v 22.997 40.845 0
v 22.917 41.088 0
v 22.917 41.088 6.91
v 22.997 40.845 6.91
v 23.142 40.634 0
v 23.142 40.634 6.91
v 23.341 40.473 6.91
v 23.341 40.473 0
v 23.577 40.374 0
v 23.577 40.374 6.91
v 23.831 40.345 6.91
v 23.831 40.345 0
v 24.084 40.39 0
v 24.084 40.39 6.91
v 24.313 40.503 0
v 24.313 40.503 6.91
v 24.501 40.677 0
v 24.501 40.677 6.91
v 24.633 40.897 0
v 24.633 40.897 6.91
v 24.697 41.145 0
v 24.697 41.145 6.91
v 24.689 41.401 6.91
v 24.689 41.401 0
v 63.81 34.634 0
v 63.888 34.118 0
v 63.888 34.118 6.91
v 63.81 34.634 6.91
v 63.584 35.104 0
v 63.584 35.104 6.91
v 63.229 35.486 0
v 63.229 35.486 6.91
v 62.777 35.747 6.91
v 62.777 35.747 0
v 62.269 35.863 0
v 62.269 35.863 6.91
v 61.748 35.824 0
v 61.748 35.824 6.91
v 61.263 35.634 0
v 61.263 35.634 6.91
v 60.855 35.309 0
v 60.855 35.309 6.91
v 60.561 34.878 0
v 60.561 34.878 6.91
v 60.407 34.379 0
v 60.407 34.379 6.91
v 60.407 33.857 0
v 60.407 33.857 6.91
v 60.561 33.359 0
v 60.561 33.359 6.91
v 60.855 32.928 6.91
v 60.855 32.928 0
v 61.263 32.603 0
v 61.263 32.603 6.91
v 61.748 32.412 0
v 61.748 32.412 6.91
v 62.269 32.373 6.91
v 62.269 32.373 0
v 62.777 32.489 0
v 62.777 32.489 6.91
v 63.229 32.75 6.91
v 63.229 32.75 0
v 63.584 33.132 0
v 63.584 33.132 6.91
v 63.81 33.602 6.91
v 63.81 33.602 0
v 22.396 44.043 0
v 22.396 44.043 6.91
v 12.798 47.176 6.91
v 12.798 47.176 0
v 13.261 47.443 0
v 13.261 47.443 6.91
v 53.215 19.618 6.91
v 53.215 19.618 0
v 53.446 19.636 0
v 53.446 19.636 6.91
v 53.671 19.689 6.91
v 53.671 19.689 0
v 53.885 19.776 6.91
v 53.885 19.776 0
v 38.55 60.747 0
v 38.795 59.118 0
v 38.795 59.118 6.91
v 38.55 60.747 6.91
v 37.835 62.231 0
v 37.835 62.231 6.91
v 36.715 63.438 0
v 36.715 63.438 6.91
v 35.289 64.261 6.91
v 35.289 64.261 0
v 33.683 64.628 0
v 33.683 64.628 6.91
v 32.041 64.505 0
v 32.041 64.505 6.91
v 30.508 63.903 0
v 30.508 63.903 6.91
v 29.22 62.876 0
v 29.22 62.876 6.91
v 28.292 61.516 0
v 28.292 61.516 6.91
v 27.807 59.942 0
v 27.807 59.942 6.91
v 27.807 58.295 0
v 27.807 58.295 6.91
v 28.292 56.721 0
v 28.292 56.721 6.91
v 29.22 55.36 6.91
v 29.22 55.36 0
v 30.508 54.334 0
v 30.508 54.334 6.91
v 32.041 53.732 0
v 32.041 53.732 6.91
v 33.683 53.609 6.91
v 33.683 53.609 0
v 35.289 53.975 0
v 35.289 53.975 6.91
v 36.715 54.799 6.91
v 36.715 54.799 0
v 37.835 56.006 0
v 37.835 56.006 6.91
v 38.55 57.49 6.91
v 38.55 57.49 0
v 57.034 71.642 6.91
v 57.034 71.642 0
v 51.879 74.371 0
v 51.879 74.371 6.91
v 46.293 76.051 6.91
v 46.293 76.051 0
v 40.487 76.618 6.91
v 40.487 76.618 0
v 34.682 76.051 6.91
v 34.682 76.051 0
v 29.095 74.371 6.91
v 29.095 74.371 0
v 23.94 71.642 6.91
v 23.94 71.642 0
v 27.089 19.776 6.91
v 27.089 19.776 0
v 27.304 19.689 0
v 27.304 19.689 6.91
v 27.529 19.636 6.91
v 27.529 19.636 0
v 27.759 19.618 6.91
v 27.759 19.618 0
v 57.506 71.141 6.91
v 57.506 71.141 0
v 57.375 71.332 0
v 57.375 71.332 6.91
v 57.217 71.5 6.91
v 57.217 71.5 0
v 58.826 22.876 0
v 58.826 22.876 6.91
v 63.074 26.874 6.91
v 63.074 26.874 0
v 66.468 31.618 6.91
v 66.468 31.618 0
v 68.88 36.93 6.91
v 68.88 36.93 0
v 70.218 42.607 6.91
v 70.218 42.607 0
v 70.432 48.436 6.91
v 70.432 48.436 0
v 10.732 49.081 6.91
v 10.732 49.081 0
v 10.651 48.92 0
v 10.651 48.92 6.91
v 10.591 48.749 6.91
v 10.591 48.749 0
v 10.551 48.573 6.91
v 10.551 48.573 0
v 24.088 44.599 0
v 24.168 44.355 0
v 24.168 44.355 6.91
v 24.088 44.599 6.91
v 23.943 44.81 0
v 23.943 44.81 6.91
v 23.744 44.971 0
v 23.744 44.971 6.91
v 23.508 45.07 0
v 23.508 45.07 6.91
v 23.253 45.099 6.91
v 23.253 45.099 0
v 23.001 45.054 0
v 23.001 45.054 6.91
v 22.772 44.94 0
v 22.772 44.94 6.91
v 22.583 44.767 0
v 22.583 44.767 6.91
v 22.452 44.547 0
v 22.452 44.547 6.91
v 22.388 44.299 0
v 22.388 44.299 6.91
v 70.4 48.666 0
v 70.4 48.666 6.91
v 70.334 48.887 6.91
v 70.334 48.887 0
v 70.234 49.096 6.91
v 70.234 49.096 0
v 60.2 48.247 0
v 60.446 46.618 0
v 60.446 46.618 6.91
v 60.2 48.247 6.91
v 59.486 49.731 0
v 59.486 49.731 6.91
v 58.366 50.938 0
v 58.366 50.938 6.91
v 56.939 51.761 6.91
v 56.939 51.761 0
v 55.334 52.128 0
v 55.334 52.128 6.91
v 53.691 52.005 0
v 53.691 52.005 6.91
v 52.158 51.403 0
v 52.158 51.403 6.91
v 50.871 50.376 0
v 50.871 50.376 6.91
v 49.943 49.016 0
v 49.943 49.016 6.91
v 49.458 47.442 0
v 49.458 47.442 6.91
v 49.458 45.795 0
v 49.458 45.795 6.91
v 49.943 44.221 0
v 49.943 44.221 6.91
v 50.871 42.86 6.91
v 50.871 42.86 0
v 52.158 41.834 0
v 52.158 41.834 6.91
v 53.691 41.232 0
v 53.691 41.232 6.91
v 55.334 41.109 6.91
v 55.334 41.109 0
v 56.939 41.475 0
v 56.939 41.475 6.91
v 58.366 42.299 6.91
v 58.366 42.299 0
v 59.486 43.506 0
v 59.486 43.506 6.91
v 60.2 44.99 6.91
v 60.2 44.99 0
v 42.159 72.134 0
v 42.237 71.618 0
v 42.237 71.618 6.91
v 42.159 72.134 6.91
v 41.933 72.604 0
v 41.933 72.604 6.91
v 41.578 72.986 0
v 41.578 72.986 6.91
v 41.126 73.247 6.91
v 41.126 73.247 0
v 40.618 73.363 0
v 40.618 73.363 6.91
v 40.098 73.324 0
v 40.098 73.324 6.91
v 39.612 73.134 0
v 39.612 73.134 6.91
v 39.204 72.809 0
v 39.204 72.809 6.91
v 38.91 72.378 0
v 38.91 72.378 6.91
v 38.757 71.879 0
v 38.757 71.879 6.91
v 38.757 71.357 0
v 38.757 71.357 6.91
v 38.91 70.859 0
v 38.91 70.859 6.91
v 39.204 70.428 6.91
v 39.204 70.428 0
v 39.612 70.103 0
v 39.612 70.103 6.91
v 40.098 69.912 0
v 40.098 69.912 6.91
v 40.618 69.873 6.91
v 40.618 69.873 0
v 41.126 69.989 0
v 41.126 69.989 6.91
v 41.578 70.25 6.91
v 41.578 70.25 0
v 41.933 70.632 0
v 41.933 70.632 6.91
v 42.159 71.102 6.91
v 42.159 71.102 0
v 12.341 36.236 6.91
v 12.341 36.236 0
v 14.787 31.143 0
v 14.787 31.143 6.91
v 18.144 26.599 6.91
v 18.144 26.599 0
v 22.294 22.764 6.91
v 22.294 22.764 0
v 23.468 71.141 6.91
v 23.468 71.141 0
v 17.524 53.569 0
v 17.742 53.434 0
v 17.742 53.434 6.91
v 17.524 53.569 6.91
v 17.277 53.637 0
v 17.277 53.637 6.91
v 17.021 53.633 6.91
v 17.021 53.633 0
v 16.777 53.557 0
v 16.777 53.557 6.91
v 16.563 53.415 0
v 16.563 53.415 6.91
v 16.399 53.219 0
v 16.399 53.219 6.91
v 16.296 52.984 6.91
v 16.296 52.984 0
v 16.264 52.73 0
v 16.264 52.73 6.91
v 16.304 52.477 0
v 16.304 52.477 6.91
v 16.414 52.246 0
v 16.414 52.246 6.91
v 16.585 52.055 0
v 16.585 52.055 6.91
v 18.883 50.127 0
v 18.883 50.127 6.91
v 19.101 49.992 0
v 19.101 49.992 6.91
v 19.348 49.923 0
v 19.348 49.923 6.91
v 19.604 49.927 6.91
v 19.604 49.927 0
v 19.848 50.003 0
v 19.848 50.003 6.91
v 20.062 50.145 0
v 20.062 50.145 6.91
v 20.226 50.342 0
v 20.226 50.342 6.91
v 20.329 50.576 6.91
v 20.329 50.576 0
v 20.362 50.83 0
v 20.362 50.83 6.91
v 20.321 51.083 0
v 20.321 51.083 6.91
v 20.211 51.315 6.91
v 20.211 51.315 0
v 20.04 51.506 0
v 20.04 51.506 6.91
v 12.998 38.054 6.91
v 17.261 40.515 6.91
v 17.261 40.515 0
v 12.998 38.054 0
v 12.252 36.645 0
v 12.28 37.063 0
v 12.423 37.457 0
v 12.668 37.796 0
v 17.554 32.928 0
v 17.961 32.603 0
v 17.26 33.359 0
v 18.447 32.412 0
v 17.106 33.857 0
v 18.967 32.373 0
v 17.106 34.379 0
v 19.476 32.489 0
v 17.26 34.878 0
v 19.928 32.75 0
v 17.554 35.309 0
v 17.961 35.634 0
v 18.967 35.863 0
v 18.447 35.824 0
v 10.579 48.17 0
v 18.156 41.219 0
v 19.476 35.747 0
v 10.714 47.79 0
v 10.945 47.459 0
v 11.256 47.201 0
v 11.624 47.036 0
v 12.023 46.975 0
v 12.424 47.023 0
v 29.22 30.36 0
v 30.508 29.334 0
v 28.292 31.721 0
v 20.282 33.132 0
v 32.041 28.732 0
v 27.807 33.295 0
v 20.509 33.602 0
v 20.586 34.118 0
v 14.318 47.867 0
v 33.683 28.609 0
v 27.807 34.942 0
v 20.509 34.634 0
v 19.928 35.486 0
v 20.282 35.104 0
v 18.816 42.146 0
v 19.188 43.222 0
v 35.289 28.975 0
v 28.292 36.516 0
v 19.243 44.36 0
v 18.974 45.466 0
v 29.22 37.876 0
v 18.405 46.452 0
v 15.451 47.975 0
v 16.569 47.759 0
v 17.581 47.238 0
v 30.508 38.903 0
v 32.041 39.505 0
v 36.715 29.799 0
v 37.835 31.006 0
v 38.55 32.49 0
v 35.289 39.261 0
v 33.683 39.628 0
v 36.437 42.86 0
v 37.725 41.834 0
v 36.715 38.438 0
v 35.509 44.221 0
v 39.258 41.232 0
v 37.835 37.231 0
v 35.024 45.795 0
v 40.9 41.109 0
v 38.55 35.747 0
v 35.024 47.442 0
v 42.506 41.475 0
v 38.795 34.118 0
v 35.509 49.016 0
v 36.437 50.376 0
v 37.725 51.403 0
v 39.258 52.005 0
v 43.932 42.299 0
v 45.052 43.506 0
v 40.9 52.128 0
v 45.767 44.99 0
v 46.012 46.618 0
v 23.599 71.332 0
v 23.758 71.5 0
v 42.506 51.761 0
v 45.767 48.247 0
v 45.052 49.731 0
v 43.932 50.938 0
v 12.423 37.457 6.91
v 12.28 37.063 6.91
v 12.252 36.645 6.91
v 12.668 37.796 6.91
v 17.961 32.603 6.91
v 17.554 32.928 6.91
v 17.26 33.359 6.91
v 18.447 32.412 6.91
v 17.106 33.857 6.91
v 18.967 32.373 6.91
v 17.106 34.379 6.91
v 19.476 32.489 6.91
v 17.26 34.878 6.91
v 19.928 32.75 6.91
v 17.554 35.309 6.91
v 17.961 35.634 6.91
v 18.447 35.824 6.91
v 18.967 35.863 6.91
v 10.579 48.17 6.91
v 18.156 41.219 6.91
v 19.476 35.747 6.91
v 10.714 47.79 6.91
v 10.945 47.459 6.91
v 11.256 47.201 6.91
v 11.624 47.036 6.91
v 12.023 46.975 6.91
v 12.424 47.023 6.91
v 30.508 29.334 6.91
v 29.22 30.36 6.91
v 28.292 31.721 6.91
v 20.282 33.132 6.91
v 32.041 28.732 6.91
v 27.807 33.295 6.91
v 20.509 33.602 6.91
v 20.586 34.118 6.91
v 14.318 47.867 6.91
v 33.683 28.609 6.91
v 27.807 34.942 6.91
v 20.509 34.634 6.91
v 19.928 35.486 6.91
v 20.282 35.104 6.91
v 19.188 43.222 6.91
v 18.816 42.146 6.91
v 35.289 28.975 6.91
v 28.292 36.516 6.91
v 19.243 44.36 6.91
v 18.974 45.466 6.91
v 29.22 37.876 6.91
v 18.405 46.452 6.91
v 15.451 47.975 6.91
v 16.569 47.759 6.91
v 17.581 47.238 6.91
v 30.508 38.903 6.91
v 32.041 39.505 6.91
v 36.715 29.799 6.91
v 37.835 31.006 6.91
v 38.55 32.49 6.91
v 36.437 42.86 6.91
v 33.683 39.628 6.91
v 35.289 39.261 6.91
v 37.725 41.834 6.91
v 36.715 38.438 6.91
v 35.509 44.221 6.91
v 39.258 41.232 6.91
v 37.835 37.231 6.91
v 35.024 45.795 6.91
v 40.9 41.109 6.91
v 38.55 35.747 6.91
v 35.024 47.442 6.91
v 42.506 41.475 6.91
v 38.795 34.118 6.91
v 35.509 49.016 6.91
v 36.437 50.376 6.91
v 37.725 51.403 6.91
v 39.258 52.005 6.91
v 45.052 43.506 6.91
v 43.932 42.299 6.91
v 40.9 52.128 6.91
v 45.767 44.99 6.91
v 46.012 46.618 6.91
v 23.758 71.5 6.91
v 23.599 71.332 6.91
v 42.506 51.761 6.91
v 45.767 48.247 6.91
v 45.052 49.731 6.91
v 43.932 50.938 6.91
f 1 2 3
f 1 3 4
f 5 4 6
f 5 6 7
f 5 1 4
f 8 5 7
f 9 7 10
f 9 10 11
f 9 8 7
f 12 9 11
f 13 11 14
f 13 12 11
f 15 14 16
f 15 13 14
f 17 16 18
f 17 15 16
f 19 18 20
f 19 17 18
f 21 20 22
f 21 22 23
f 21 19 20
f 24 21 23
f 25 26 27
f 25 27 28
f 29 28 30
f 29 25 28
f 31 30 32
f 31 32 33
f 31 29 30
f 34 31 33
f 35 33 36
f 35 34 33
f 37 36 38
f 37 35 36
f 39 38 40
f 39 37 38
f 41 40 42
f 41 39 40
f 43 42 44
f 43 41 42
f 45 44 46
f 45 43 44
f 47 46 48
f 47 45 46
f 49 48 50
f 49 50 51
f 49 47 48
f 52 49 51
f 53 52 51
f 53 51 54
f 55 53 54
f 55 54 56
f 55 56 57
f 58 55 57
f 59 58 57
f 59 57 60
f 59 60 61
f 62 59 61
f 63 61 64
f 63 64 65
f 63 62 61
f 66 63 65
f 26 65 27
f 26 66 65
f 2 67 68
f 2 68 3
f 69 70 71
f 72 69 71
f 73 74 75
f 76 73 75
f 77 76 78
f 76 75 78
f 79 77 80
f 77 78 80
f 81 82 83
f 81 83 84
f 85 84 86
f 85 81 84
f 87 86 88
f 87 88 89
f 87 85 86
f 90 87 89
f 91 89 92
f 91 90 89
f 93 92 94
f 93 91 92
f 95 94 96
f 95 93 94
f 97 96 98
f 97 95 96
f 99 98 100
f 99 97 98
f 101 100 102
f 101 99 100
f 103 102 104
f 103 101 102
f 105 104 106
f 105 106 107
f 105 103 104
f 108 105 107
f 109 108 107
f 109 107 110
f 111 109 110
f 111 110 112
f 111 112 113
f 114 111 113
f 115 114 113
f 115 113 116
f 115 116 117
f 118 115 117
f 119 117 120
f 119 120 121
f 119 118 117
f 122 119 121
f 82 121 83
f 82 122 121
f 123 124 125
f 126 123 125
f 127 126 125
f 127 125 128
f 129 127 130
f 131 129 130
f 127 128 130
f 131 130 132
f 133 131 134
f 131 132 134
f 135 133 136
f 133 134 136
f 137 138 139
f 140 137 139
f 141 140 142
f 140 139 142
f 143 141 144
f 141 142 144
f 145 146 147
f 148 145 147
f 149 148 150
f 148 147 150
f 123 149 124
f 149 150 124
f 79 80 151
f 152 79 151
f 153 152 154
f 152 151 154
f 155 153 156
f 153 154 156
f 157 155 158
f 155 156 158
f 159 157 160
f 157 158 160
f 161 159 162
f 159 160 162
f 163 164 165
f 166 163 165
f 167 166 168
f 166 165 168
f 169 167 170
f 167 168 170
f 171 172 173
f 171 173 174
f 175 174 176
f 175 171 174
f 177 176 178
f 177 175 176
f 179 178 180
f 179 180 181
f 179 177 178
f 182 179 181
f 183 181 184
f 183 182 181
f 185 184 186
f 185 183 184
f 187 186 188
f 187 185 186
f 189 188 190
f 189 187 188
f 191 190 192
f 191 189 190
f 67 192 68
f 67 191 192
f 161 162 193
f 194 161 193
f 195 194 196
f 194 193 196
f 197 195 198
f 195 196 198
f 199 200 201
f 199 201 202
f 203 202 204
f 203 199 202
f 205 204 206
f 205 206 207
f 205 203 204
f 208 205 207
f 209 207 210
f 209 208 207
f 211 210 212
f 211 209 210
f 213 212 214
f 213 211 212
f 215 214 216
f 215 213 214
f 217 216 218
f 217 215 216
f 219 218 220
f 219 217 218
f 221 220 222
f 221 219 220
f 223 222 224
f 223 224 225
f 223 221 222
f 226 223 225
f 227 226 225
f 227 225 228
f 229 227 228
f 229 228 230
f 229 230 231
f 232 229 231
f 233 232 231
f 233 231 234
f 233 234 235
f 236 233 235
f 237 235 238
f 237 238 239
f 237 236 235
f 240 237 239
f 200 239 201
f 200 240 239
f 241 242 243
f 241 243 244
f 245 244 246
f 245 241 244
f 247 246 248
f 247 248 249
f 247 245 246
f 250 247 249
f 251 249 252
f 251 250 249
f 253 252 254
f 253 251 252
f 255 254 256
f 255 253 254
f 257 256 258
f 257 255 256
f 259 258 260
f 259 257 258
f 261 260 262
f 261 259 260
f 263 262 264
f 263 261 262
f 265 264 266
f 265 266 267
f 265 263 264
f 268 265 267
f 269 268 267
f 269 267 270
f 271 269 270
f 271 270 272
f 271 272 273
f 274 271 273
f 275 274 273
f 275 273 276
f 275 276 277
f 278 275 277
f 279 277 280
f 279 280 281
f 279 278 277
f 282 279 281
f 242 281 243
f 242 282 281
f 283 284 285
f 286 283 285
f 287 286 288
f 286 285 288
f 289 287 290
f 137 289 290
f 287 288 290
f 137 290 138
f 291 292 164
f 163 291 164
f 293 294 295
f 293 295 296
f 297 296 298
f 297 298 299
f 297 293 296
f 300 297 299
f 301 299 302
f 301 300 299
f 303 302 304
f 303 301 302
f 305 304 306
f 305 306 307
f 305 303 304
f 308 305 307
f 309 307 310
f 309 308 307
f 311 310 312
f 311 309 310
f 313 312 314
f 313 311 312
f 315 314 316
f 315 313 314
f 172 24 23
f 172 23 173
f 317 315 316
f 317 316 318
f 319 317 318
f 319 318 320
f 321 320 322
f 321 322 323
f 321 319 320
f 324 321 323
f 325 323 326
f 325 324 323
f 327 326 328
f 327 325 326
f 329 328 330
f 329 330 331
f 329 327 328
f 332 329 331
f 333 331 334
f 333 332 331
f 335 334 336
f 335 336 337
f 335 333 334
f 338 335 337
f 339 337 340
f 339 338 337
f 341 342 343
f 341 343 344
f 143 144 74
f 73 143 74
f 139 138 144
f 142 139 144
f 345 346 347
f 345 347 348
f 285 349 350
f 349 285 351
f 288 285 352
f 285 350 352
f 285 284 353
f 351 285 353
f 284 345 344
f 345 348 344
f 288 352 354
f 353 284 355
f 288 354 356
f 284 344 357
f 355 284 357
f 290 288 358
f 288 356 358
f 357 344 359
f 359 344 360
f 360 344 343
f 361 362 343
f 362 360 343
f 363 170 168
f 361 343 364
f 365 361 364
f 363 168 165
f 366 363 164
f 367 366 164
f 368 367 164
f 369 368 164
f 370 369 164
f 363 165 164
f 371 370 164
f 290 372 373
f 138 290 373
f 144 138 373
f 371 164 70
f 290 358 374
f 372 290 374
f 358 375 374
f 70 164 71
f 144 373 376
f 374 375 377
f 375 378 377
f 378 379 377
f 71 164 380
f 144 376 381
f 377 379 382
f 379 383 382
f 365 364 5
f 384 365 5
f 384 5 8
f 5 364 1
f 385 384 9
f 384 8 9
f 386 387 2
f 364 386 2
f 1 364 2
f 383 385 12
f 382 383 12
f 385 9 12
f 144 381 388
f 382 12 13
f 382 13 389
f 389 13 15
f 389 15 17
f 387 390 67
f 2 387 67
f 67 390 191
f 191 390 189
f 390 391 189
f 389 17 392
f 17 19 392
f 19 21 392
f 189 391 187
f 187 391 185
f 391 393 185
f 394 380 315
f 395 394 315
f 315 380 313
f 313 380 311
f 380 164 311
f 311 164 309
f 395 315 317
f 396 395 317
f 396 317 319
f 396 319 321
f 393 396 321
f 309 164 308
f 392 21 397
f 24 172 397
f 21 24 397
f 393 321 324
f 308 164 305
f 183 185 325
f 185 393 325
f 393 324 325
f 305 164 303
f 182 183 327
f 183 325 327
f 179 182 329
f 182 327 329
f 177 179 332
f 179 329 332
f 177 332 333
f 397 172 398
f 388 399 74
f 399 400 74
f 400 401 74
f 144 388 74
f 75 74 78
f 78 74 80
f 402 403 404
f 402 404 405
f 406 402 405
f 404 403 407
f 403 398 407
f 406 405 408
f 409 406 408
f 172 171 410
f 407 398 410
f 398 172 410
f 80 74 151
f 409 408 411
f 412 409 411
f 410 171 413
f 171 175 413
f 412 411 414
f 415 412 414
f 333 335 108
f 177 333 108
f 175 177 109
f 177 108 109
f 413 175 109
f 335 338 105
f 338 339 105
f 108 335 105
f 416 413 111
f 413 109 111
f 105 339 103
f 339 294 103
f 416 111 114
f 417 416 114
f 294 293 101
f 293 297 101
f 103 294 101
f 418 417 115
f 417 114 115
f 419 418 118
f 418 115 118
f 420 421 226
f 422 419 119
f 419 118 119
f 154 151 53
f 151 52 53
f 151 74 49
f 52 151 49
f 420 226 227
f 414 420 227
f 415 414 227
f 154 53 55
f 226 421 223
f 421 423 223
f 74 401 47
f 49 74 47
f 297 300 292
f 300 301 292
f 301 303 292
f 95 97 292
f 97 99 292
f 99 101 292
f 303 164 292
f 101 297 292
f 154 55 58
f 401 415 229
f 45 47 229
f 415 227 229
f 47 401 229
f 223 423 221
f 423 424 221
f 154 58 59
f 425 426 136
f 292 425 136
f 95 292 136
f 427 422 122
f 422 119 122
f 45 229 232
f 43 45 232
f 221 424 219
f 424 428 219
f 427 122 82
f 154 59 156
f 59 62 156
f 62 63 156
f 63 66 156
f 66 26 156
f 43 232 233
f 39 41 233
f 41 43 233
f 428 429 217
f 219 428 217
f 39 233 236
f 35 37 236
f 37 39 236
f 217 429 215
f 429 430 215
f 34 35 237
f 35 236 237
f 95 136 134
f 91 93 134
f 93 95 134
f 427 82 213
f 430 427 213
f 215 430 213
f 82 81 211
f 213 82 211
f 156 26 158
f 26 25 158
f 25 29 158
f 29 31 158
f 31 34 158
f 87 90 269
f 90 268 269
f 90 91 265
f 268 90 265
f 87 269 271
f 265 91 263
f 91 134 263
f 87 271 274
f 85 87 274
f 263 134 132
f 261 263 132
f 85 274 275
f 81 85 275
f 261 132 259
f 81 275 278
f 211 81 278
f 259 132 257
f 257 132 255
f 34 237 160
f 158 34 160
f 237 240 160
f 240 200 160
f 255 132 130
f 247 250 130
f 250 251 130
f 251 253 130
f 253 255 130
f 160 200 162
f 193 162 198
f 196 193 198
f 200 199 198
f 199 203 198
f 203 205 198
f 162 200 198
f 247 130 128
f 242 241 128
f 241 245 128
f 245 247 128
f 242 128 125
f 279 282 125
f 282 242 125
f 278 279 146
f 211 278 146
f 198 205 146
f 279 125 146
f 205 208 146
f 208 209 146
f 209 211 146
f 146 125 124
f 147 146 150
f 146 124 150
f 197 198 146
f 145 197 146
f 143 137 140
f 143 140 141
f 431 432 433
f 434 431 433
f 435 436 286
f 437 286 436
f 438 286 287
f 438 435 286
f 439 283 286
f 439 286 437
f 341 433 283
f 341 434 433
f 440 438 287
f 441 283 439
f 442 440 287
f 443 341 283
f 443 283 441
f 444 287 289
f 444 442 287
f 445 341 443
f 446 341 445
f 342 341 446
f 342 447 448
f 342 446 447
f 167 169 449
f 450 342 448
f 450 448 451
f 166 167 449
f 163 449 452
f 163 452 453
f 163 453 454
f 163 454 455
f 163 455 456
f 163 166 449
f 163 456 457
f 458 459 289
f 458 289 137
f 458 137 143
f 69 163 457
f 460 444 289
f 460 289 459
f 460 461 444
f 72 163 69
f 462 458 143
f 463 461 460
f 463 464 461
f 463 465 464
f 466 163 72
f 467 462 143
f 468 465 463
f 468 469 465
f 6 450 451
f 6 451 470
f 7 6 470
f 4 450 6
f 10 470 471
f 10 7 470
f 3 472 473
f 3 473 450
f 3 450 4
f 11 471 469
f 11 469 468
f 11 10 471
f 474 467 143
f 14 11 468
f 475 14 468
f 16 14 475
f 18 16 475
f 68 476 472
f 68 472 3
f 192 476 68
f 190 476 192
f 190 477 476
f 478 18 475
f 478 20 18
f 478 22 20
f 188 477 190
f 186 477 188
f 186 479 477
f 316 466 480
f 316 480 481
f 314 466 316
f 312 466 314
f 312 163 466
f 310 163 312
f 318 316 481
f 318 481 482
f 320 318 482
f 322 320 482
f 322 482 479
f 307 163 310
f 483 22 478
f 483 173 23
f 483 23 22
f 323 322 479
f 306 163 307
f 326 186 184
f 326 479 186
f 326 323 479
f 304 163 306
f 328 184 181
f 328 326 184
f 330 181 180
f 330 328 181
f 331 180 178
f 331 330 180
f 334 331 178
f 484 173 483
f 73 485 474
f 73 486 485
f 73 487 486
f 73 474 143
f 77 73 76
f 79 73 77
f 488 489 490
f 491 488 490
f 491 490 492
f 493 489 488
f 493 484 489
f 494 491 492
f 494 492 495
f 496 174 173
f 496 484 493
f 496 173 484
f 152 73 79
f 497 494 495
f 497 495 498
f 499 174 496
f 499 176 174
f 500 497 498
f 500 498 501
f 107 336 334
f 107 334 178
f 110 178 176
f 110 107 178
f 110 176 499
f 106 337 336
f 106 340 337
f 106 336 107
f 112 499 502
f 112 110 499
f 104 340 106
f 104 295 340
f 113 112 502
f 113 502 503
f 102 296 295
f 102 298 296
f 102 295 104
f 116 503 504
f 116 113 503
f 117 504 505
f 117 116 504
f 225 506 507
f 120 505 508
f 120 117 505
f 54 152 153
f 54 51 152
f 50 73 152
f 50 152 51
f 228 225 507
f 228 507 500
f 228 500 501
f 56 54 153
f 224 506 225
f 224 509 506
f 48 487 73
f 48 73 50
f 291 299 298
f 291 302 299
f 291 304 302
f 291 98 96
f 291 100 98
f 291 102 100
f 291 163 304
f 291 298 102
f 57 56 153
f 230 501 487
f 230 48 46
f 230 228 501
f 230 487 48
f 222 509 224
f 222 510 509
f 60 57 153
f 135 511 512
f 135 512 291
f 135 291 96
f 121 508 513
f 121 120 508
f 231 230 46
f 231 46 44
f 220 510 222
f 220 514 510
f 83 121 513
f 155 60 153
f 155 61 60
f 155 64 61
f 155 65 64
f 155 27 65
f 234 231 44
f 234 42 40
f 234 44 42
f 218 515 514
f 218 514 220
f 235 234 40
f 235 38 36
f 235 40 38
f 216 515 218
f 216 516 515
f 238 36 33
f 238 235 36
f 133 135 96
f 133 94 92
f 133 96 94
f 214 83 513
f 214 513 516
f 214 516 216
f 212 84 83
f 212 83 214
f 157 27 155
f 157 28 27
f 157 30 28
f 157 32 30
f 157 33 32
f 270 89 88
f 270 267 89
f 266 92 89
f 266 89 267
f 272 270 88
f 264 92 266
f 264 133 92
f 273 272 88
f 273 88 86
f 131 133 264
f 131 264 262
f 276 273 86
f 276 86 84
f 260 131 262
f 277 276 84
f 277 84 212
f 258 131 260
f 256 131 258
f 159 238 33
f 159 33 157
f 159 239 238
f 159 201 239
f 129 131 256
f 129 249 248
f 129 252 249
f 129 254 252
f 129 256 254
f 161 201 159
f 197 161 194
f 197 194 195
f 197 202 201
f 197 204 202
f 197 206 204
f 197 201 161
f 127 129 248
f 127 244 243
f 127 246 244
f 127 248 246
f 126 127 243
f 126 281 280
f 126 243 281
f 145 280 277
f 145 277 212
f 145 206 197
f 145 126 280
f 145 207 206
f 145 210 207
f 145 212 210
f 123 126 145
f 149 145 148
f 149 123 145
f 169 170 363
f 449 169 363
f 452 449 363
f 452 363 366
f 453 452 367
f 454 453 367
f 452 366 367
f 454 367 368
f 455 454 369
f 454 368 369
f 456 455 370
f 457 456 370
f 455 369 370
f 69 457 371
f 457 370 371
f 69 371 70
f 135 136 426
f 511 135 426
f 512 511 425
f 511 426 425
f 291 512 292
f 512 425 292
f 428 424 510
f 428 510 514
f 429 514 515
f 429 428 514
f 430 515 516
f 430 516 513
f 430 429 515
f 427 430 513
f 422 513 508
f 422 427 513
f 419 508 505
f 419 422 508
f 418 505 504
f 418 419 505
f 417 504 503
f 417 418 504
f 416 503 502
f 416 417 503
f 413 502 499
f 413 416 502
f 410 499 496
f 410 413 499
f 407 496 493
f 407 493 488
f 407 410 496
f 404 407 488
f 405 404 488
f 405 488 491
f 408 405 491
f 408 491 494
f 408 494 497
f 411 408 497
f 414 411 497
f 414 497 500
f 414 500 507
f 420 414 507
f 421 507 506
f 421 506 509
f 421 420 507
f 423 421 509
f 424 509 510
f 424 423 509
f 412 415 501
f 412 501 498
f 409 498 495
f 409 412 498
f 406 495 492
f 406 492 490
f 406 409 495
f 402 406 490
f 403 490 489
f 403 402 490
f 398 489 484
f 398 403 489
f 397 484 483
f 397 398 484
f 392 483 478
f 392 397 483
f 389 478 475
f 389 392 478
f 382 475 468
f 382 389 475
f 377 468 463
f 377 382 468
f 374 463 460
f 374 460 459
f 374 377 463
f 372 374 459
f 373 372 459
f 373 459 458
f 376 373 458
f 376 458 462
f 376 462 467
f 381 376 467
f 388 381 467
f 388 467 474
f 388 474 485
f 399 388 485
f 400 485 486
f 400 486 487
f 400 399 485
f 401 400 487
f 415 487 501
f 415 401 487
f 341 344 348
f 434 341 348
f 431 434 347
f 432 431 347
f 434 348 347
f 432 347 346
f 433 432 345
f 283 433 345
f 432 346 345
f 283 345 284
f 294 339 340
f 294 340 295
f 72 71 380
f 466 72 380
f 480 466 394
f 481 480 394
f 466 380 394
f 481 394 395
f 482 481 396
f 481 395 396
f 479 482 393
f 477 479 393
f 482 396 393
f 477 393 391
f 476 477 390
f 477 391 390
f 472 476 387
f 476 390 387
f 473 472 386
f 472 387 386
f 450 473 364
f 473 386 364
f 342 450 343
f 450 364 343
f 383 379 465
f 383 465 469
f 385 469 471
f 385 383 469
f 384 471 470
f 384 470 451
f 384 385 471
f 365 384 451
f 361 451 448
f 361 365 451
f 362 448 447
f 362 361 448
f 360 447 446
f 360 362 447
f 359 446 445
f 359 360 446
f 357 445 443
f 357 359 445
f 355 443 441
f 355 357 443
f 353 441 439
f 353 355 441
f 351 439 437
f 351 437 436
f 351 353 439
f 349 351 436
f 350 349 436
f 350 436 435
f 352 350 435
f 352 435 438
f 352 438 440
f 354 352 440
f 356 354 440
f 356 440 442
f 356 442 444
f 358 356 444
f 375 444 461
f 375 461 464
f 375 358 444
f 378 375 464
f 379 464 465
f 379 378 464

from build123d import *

# Parameters (mm, degrees)
SKETCH1_R           = 5.525
SKETCH1_R_2         = 1.75
BOSS_EXTRUDE1_DEPTH = 6.91


with BuildPart() as part:
    # Sketch1 → Boss-Extrude1 (new body)
    with BuildSketch(Plane.XY):
        with BuildLine():
            Line((27.759212348, 19.618292738), (53.215056471, 19.618292738))
            ThreePointArc((53.215056471, 19.618292738), (53.559180072, 19.658299948), (53.884947106, 19.776187475))
            ThreePointArc((53.884947106, 19.776187475), (66.467896523, 31.618292738), (70.431985807, 48.436499219))
            ThreePointArc((70.431985807, 48.436499219), (70.371195883, 48.77756551), (70.233781342, 49.095588895))
            Line((70.233781342, 49.095588895), (57.505859281, 71.14099658))
            ThreePointArc((57.505859281, 71.14099658), (57.299150221, 71.419012756), (57.03417311, 71.642191519))
            ThreePointArc((57.03417311, 71.642191519), (40.48713441, 76.618292738), (23.940095709, 71.642191519))
            ThreePointArc((23.940095709, 71.642191519), (23.675118599, 71.419012756), (23.468409538, 71.14099658))
            Line((23.468409538, 71.14099658), (10.732258497, 49.081335884))
            ThreePointArc((10.732258497, 49.081335884), (10.618509348, 48.835351928), (10.550877955, 48.572915326))
            ThreePointArc((10.550877955, 48.572915326), (11.255747963, 47.20128209), (12.797690777, 47.176146091))
            Line((12.797690777, 47.176146091), (13.260683436, 47.443455028))
            ThreePointArc((13.260683436, 47.443455028), (18.724785051, 45.979353412), (17.260683436, 40.515251797))
            Line((17.260683436, 40.515251797), (12.998198083, 38.054304731))
            ThreePointArc((12.998198083, 38.054304731), (12.337555741, 37.265255041), (12.340885644, 36.236159988))
            ThreePointArc((12.340885644, 36.236159988), (18.144128021, 26.598550843), (27.089321713, 19.776187475))
            ThreePointArc((27.089321713, 19.776187475), (27.415088747, 19.658299948), (27.759212348, 19.618292738))
        make_face()
        with Locations((33.270256045, 34.118292738)):
            Circle(SKETCH1_R, mode=Mode.SUBTRACT)
        with Locations((54.920891139, 46.618292738)):
            Circle(SKETCH1_R, mode=Mode.SUBTRACT)
        with Locations((33.270256045, 59.118292738)):
            Circle(SKETCH1_R, mode=Mode.SUBTRACT)
        with Locations((40.48713441, 46.618292738)):
            Circle(SKETCH1_R, mode=Mode.SUBTRACT)
        with Locations((18.836499315, 34.118292738)):
            Circle(SKETCH1_R_2, mode=Mode.SUBTRACT)
        with Locations((62.137769504, 34.118292738)):
            Circle(SKETCH1_R_2, mode=Mode.SUBTRACT)
        with Locations((40.48713441, 71.618292738)):
            Circle(SKETCH1_R_2, mode=Mode.SUBTRACT)
        with BuildLine():
            Line((24.689235101, 41.401001388), (24.168290568, 44.355424648))
            ThreePointArc((24.168290568, 44.355424648), (23.12568023, 45.085468265), (22.395636613, 44.042857928))
            Line((22.395636613, 44.042857928), (22.916581146, 41.088434669))
            ThreePointArc((22.916581146, 41.088434669), (23.959191483, 40.358391051), (24.689235101, 41.401001388))
        make_face(mode=Mode.SUBTRACT)
        with BuildLine():
            Line((20.040174245, 51.505531858), (17.742040916, 53.433894687))
            ThreePointArc((17.742040916, 53.433894687), (16.474092068, 53.322963537), (16.585023219, 52.055014689))
            Line((16.585023219, 52.055014689), (18.883156548, 50.12665186))
            ThreePointArc((18.883156548, 50.12665186), (20.151105395, 50.237583011), (20.040174245, 51.505531858))
        make_face(mode=Mode.SUBTRACT)
    extrude(amount=BOSS_EXTRUDE1_DEPTH)


solid = part.part
